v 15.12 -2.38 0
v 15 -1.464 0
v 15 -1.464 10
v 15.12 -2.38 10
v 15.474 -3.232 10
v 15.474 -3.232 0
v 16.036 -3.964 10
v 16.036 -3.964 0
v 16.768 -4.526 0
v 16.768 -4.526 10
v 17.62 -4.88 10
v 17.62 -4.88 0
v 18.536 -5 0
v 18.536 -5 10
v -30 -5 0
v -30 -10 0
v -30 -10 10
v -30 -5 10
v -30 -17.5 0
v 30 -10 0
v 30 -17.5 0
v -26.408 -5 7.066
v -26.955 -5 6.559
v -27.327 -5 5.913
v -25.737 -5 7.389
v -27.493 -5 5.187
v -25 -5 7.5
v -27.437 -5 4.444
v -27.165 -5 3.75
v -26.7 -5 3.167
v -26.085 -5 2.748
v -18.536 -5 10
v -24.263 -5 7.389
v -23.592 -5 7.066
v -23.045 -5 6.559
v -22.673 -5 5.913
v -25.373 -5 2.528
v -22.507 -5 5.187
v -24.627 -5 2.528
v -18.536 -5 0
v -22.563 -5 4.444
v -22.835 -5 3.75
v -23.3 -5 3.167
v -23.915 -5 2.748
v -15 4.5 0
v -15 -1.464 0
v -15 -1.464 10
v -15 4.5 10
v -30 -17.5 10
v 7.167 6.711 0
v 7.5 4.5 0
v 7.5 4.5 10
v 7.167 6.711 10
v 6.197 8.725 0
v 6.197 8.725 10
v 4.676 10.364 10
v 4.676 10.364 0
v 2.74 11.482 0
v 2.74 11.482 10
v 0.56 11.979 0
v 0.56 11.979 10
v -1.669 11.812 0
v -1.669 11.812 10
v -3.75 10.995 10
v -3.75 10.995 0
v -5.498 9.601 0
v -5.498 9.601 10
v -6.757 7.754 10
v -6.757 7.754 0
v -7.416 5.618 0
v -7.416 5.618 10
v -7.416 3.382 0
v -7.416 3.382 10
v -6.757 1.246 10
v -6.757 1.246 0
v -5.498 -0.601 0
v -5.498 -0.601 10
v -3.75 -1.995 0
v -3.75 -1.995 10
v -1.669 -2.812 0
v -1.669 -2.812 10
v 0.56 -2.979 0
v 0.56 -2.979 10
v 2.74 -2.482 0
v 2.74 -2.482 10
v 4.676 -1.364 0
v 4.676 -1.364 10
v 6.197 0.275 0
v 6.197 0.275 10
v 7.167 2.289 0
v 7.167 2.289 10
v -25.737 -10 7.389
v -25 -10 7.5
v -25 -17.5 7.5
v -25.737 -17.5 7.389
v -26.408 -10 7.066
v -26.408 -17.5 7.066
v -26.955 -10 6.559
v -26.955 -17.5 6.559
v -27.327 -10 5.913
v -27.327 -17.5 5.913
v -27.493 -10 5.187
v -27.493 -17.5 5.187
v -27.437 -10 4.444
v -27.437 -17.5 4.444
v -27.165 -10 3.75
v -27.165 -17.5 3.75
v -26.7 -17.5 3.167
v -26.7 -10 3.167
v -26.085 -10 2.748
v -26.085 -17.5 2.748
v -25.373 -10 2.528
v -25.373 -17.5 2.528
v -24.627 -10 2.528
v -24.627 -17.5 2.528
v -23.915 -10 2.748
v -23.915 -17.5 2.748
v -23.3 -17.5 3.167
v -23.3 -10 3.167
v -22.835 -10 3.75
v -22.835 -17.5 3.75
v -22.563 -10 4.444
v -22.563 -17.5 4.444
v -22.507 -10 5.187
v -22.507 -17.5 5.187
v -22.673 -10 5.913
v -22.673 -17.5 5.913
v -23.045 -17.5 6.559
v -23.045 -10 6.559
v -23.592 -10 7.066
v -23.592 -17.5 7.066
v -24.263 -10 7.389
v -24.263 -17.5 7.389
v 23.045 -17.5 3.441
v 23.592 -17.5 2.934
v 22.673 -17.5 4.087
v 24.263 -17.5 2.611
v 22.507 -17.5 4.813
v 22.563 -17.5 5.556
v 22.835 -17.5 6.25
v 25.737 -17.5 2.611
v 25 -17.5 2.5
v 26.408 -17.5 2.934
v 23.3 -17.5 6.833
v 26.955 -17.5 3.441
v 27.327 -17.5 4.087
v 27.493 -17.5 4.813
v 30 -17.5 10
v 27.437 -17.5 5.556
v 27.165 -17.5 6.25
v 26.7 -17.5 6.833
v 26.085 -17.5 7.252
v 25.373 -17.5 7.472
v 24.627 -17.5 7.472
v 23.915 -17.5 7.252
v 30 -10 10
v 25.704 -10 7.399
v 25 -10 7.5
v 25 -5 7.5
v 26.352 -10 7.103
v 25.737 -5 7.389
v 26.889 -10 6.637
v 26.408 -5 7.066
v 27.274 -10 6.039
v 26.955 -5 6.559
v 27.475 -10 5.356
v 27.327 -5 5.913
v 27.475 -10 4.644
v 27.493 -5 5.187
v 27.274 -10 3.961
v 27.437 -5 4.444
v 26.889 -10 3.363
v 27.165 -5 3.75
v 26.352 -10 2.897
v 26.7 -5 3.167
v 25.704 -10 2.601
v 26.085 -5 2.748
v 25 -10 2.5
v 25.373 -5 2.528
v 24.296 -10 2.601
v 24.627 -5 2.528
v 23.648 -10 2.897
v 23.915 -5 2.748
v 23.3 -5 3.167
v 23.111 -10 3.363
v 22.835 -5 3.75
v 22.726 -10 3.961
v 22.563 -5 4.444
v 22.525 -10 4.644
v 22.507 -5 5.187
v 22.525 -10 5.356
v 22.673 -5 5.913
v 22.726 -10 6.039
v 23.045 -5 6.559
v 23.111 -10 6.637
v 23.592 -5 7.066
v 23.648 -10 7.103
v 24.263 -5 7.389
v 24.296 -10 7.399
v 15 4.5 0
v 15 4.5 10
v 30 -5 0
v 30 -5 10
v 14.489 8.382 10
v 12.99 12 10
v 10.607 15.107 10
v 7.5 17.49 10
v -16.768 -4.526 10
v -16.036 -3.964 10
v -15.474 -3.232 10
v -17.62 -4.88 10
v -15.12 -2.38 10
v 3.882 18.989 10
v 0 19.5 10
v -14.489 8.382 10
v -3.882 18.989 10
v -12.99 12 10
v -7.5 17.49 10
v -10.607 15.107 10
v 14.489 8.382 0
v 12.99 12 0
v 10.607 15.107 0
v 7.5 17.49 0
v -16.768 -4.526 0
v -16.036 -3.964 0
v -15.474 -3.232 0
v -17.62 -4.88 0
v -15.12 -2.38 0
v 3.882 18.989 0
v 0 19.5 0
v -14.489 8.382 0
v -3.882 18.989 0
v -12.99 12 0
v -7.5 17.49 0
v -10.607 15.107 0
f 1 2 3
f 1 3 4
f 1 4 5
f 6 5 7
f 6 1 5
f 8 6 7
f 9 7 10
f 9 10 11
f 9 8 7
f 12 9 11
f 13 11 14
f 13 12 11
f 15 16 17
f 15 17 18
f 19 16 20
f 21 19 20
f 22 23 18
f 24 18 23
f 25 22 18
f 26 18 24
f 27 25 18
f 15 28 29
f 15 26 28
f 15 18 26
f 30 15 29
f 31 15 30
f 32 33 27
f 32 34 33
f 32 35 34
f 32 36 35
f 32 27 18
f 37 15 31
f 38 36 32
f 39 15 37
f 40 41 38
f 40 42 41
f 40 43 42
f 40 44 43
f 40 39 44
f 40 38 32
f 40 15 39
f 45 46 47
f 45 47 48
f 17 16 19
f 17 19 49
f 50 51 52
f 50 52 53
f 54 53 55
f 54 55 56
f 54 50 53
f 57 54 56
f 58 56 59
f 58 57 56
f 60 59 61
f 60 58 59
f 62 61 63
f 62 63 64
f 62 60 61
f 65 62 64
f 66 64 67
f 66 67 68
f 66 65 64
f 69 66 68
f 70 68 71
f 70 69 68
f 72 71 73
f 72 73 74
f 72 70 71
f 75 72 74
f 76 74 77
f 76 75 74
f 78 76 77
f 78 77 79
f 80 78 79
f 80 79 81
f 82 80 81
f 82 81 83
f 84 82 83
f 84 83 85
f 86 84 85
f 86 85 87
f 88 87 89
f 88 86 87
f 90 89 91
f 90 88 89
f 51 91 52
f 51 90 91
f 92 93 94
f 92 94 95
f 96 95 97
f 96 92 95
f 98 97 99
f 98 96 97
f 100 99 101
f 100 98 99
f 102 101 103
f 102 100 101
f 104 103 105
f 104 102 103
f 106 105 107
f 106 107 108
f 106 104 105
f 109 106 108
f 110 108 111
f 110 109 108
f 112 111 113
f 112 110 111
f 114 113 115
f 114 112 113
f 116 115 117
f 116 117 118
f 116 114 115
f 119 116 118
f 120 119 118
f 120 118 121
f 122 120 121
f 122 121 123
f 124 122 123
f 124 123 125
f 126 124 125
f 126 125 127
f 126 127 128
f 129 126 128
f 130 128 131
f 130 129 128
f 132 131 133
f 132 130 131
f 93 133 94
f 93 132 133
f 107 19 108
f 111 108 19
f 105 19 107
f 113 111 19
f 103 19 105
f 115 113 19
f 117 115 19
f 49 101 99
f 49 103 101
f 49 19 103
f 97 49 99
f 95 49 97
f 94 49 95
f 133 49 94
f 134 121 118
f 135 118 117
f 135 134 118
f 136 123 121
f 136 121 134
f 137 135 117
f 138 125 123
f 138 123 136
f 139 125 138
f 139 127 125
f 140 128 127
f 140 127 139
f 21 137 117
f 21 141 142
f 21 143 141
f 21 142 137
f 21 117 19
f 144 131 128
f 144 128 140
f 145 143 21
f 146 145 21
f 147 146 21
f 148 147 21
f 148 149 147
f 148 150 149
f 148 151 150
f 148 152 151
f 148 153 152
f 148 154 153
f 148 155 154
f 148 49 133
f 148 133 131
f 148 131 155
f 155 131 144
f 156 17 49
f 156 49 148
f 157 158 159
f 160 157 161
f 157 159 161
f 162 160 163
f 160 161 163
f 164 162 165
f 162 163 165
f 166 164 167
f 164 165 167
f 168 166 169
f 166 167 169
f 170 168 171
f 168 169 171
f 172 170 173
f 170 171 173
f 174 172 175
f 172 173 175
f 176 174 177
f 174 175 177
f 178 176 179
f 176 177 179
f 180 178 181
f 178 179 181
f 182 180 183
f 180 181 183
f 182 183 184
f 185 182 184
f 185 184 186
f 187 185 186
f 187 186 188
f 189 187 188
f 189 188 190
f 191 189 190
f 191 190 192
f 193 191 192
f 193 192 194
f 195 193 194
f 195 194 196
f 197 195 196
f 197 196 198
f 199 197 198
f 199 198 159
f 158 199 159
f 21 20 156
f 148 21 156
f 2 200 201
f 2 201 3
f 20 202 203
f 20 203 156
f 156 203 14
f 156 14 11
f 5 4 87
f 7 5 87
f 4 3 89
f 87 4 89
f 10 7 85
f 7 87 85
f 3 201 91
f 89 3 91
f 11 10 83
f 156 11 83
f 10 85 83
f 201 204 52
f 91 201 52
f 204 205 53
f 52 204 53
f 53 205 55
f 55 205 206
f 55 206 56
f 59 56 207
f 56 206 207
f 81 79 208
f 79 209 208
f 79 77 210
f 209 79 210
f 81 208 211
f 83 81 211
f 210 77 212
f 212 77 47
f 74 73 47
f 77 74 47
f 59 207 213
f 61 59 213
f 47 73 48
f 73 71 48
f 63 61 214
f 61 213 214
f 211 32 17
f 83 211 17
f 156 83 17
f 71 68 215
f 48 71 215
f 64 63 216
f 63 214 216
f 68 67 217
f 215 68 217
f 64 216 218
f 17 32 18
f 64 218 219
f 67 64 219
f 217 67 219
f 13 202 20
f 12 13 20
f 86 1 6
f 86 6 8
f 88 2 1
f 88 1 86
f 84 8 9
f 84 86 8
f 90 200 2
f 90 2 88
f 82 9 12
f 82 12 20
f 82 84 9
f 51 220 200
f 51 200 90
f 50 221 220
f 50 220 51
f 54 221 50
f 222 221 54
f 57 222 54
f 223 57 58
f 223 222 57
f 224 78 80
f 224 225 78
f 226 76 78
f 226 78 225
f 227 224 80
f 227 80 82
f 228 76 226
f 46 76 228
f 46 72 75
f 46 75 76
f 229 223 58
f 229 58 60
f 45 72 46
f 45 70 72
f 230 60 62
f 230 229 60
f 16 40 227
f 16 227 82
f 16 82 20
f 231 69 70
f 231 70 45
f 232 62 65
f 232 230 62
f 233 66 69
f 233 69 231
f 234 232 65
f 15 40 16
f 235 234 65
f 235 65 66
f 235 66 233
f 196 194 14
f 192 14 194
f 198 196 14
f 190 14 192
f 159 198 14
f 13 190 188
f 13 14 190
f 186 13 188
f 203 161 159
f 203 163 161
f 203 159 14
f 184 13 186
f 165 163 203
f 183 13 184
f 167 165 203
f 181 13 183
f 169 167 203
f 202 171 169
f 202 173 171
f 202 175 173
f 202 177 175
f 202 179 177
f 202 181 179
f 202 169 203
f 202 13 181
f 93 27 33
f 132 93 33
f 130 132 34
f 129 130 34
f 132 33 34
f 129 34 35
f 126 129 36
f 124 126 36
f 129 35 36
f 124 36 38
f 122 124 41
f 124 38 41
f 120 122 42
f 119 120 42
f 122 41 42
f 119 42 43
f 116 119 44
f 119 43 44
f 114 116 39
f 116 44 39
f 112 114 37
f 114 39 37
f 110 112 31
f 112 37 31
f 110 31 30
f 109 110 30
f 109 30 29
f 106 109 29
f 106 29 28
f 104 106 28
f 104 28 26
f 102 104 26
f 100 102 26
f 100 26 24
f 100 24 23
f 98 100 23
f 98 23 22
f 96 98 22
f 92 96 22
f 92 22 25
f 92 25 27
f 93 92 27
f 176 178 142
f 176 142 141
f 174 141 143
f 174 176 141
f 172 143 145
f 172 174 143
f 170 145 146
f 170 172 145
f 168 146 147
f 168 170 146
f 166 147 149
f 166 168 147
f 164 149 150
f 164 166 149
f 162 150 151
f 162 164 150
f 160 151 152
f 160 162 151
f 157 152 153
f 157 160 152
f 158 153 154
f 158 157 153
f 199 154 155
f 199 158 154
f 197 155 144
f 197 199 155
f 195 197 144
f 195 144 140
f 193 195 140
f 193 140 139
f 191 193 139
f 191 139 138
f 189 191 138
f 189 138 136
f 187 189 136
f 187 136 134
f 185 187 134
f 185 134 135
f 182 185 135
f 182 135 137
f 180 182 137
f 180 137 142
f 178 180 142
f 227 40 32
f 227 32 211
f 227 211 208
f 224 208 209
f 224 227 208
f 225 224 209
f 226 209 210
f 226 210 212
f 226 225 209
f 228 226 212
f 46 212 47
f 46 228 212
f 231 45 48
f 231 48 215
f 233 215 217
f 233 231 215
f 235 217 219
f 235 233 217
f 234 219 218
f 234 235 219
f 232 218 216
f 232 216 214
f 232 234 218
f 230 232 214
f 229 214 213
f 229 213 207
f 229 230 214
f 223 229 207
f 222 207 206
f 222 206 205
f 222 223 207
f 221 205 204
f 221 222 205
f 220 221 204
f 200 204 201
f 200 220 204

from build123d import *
from build123d.topology import SkipClean

# Parameters (mm, degrees)
SKETCH1_R           = 7.5
BOSS_EXTRUDE2_DEPTH = 10
SKETCH2_R           = 2.5
CUT_EXTRUDE1_DEPTH  = 10
SKETCH3_W           = 60
SKETCH3_H           = 10
SKETCH3_R           = 2.5
BOSS_EXTRUDE3_DEPTH = 7.5


with BuildPart() as part:
    # Sketch1 → Boss-Extrude2 (new body)
    with BuildSketch(Plane.XY):
        with BuildLine():
            Line((-15, -1.464466094), (-15, 4.5))
            ThreePointArc((-15, 4.5), (0, 19.5), (15, 4.5))
            Line((15, 4.5), (15, -1.464466094))
            ThreePointArc((15, -1.464466094), (16.035533906, -3.964466094), (18.535533906, -5))
            Line((18.535533906, -5), (30, -5))
            Line((30, -5), (30, -10))
            Line((30, -10), (20, -10))
            Line((20, -10), (0, -10))
            Line((0, -10), (-20, -10))
            Line((-20, -10), (-30, -10))
            Line((-30, -10), (-30, -5))
            Line((-30, -5), (-18.535533906, -5))
            ThreePointArc((-18.535533906, -5), (-16.035533906, -3.964466094), (-15, -1.464466094))
        make_face()
        with Locations((0, 4.5)):
            Circle(SKETCH1_R, mode=Mode.SUBTRACT)
    extrude(amount=BOSS_EXTRUDE2_DEPTH)

    # Sketch2 → Cut-Extrude1 (cut)
    with BuildSketch(Plane(origin=(0, -5, 0), x_dir=(1, 0, 0), z_dir=(0, 1, 0))):
        with Locations(Location((-25, -5, 0), (0, 0, 270))):
            Circle(SKETCH2_R)
        with Locations(Location((25, -5, 0), (0, 0, 270))):
            Circle(SKETCH2_R)
    extrude(amount=-CUT_EXTRUDE1_DEPTH, mode=Mode.SUBTRACT)

    # Sketch3 → Boss-Extrude3 (add)
    with SkipClean():  # the faces are left unmerged after this step: merging them gives an invalid solid
        with BuildSketch(Plane.XZ.offset(10)):
            with Locations((0, 5)):
                Rectangle(SKETCH3_W, SKETCH3_H)
            with Locations(Location((-25, 5, 0), (0, 0, 90))):
                Circle(SKETCH3_R, mode=Mode.SUBTRACT)
            with Locations(Location((25, 5, 0), (0, 0, 270))):
                Circle(SKETCH3_R, mode=Mode.SUBTRACT)
        extrude(amount=BOSS_EXTRUDE3_DEPTH)


solid = part.part
